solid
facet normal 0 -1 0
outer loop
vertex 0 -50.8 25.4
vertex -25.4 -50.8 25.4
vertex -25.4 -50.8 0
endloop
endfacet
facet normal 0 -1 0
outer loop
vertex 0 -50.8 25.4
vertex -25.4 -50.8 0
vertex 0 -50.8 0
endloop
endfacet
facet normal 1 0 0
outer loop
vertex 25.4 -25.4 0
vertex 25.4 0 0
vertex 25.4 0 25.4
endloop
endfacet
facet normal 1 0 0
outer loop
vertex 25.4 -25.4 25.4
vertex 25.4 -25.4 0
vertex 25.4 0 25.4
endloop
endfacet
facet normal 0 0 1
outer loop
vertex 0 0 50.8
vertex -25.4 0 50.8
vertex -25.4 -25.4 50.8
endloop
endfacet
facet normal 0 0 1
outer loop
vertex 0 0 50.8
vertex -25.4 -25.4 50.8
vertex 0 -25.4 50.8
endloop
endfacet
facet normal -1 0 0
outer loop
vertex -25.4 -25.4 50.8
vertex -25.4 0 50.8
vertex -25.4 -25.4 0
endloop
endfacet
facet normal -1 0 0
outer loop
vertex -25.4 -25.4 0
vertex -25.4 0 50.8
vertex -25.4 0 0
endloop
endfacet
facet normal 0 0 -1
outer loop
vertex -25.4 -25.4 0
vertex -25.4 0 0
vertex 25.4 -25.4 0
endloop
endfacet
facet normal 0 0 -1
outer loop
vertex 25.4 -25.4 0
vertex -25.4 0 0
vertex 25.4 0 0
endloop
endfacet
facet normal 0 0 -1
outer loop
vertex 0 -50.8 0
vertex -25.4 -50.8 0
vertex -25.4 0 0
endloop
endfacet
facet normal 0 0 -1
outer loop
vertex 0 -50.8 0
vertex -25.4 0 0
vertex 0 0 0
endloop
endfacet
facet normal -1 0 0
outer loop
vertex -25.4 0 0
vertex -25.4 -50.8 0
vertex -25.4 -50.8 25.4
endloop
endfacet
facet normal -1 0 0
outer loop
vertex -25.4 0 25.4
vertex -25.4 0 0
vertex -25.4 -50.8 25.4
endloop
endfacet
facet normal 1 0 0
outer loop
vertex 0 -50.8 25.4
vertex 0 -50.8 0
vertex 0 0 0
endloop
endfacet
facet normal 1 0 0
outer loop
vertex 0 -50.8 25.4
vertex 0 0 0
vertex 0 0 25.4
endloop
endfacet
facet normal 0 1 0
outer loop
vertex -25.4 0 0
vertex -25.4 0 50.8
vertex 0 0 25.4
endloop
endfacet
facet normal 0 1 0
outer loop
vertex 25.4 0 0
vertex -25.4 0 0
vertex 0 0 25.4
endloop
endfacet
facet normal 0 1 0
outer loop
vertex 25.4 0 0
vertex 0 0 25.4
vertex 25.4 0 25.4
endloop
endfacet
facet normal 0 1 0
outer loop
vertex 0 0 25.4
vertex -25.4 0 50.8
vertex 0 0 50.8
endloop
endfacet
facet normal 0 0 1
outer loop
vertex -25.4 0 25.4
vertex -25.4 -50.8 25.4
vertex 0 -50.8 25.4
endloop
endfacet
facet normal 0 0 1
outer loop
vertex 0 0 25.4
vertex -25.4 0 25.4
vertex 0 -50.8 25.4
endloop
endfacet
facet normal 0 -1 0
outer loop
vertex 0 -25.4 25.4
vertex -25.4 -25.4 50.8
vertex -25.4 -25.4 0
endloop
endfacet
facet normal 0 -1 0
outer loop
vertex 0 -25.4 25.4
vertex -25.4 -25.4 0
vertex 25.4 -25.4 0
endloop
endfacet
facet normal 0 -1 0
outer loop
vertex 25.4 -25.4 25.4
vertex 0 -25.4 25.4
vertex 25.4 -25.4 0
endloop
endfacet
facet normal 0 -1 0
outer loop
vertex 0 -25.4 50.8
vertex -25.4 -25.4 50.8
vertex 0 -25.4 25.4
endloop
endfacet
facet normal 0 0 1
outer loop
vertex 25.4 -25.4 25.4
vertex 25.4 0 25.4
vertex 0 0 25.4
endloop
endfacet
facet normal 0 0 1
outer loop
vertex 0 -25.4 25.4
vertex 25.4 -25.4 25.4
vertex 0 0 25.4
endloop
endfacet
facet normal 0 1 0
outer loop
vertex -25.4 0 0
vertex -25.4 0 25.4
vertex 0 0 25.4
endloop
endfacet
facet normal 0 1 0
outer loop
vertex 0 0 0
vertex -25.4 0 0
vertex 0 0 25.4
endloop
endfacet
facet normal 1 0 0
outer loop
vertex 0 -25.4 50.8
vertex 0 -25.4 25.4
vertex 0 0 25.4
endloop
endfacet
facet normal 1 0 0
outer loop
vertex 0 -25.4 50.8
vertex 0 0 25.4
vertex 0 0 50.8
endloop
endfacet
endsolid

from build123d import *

# Parameters (mm, degrees)
F0_W     = 25.4
F0_H     = 25.4
F1_DEPTH = 50.8
F2_DEPTH = 25.4


with BuildPart() as f1:
    # F0 (on Front) → F1 (new body)
    with BuildSketch(Plane.XZ):
        with Locations((-12.7, 12.7)):
            Rectangle(F0_W, F0_H)
    extrude(amount=F1_DEPTH)


with BuildPart() as f2:
    # F0 (on Front) → F2 (new body)
    with BuildSketch(Plane.XZ):
        with Locations((12.7, 12.7)):
            Rectangle(F0_W, F0_H)
        with Locations((-12.7, 12.7)):
            Rectangle(F0_W, F0_H)
        with Locations((-12.7, 38.1)):
            Rectangle(F0_W, F0_H)
    extrude(amount=F2_DEPTH)


solid = Compound([f1.part, f2.part])
